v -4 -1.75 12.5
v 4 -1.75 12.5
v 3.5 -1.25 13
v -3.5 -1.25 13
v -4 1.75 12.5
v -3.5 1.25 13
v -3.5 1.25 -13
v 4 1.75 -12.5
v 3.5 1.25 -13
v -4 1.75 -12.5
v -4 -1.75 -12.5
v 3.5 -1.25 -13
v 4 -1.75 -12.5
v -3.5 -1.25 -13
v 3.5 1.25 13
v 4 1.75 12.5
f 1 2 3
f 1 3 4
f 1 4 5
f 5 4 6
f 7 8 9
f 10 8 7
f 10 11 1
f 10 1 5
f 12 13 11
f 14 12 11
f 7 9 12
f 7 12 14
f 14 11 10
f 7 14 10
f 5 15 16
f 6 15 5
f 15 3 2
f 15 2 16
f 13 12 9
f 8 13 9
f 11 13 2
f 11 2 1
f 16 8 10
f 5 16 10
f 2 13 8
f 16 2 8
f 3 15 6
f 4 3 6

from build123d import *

# Parameters (mm, degrees)
SKETCH1_W           = 8
SKETCH1_H           = 3.5
BOSS_EXTRUDE1_DEPTH = 5
SKETCH2_W           = 8
SKETCH2_H           = 3.5
BOSS_EXTRUDE2_DEPTH = 8
CHAMFER1_SIZE       = 0.5


with BuildPart() as part:
    # Sketch1 → Boss-Extrude1 (new, symmetric)
    with BuildSketch(Plane.XY):
        Rectangle(SKETCH1_W, SKETCH1_H)
    extrude(amount=BOSS_EXTRUDE1_DEPTH, both=True)

    # Sketch2 → Boss-Extrude2 (add)
    with BuildSketch(Plane(origin=(0, 0, -5), x_dir=(-1, 0, 0), z_dir=(0, 0, -1))):
        Rectangle(SKETCH2_W, SKETCH2_H)
    boss_extrude2 = extrude(amount=BOSS_EXTRUDE2_DEPTH)

    # Mirror1: Boss-Extrude2 across plane
    add(boss_extrude2.mirror(Plane.XY))

    # Chamfer1
    chamfer1_edges = [part.edges().sort_by_distance(p)[0] for p in [
        (-4, 0, -13),
        (0, 1.75, -13),
        (4, 0, -13),
        (0, -1.75, -13),
        (-4, 0, 13),
        (0, -1.75, 13),
        (4, 0, 13),
        (0, 1.75, 13),
    ]]
    chamfer(chamfer1_edges, length=CHAMFER1_SIZE)


solid = part.part
